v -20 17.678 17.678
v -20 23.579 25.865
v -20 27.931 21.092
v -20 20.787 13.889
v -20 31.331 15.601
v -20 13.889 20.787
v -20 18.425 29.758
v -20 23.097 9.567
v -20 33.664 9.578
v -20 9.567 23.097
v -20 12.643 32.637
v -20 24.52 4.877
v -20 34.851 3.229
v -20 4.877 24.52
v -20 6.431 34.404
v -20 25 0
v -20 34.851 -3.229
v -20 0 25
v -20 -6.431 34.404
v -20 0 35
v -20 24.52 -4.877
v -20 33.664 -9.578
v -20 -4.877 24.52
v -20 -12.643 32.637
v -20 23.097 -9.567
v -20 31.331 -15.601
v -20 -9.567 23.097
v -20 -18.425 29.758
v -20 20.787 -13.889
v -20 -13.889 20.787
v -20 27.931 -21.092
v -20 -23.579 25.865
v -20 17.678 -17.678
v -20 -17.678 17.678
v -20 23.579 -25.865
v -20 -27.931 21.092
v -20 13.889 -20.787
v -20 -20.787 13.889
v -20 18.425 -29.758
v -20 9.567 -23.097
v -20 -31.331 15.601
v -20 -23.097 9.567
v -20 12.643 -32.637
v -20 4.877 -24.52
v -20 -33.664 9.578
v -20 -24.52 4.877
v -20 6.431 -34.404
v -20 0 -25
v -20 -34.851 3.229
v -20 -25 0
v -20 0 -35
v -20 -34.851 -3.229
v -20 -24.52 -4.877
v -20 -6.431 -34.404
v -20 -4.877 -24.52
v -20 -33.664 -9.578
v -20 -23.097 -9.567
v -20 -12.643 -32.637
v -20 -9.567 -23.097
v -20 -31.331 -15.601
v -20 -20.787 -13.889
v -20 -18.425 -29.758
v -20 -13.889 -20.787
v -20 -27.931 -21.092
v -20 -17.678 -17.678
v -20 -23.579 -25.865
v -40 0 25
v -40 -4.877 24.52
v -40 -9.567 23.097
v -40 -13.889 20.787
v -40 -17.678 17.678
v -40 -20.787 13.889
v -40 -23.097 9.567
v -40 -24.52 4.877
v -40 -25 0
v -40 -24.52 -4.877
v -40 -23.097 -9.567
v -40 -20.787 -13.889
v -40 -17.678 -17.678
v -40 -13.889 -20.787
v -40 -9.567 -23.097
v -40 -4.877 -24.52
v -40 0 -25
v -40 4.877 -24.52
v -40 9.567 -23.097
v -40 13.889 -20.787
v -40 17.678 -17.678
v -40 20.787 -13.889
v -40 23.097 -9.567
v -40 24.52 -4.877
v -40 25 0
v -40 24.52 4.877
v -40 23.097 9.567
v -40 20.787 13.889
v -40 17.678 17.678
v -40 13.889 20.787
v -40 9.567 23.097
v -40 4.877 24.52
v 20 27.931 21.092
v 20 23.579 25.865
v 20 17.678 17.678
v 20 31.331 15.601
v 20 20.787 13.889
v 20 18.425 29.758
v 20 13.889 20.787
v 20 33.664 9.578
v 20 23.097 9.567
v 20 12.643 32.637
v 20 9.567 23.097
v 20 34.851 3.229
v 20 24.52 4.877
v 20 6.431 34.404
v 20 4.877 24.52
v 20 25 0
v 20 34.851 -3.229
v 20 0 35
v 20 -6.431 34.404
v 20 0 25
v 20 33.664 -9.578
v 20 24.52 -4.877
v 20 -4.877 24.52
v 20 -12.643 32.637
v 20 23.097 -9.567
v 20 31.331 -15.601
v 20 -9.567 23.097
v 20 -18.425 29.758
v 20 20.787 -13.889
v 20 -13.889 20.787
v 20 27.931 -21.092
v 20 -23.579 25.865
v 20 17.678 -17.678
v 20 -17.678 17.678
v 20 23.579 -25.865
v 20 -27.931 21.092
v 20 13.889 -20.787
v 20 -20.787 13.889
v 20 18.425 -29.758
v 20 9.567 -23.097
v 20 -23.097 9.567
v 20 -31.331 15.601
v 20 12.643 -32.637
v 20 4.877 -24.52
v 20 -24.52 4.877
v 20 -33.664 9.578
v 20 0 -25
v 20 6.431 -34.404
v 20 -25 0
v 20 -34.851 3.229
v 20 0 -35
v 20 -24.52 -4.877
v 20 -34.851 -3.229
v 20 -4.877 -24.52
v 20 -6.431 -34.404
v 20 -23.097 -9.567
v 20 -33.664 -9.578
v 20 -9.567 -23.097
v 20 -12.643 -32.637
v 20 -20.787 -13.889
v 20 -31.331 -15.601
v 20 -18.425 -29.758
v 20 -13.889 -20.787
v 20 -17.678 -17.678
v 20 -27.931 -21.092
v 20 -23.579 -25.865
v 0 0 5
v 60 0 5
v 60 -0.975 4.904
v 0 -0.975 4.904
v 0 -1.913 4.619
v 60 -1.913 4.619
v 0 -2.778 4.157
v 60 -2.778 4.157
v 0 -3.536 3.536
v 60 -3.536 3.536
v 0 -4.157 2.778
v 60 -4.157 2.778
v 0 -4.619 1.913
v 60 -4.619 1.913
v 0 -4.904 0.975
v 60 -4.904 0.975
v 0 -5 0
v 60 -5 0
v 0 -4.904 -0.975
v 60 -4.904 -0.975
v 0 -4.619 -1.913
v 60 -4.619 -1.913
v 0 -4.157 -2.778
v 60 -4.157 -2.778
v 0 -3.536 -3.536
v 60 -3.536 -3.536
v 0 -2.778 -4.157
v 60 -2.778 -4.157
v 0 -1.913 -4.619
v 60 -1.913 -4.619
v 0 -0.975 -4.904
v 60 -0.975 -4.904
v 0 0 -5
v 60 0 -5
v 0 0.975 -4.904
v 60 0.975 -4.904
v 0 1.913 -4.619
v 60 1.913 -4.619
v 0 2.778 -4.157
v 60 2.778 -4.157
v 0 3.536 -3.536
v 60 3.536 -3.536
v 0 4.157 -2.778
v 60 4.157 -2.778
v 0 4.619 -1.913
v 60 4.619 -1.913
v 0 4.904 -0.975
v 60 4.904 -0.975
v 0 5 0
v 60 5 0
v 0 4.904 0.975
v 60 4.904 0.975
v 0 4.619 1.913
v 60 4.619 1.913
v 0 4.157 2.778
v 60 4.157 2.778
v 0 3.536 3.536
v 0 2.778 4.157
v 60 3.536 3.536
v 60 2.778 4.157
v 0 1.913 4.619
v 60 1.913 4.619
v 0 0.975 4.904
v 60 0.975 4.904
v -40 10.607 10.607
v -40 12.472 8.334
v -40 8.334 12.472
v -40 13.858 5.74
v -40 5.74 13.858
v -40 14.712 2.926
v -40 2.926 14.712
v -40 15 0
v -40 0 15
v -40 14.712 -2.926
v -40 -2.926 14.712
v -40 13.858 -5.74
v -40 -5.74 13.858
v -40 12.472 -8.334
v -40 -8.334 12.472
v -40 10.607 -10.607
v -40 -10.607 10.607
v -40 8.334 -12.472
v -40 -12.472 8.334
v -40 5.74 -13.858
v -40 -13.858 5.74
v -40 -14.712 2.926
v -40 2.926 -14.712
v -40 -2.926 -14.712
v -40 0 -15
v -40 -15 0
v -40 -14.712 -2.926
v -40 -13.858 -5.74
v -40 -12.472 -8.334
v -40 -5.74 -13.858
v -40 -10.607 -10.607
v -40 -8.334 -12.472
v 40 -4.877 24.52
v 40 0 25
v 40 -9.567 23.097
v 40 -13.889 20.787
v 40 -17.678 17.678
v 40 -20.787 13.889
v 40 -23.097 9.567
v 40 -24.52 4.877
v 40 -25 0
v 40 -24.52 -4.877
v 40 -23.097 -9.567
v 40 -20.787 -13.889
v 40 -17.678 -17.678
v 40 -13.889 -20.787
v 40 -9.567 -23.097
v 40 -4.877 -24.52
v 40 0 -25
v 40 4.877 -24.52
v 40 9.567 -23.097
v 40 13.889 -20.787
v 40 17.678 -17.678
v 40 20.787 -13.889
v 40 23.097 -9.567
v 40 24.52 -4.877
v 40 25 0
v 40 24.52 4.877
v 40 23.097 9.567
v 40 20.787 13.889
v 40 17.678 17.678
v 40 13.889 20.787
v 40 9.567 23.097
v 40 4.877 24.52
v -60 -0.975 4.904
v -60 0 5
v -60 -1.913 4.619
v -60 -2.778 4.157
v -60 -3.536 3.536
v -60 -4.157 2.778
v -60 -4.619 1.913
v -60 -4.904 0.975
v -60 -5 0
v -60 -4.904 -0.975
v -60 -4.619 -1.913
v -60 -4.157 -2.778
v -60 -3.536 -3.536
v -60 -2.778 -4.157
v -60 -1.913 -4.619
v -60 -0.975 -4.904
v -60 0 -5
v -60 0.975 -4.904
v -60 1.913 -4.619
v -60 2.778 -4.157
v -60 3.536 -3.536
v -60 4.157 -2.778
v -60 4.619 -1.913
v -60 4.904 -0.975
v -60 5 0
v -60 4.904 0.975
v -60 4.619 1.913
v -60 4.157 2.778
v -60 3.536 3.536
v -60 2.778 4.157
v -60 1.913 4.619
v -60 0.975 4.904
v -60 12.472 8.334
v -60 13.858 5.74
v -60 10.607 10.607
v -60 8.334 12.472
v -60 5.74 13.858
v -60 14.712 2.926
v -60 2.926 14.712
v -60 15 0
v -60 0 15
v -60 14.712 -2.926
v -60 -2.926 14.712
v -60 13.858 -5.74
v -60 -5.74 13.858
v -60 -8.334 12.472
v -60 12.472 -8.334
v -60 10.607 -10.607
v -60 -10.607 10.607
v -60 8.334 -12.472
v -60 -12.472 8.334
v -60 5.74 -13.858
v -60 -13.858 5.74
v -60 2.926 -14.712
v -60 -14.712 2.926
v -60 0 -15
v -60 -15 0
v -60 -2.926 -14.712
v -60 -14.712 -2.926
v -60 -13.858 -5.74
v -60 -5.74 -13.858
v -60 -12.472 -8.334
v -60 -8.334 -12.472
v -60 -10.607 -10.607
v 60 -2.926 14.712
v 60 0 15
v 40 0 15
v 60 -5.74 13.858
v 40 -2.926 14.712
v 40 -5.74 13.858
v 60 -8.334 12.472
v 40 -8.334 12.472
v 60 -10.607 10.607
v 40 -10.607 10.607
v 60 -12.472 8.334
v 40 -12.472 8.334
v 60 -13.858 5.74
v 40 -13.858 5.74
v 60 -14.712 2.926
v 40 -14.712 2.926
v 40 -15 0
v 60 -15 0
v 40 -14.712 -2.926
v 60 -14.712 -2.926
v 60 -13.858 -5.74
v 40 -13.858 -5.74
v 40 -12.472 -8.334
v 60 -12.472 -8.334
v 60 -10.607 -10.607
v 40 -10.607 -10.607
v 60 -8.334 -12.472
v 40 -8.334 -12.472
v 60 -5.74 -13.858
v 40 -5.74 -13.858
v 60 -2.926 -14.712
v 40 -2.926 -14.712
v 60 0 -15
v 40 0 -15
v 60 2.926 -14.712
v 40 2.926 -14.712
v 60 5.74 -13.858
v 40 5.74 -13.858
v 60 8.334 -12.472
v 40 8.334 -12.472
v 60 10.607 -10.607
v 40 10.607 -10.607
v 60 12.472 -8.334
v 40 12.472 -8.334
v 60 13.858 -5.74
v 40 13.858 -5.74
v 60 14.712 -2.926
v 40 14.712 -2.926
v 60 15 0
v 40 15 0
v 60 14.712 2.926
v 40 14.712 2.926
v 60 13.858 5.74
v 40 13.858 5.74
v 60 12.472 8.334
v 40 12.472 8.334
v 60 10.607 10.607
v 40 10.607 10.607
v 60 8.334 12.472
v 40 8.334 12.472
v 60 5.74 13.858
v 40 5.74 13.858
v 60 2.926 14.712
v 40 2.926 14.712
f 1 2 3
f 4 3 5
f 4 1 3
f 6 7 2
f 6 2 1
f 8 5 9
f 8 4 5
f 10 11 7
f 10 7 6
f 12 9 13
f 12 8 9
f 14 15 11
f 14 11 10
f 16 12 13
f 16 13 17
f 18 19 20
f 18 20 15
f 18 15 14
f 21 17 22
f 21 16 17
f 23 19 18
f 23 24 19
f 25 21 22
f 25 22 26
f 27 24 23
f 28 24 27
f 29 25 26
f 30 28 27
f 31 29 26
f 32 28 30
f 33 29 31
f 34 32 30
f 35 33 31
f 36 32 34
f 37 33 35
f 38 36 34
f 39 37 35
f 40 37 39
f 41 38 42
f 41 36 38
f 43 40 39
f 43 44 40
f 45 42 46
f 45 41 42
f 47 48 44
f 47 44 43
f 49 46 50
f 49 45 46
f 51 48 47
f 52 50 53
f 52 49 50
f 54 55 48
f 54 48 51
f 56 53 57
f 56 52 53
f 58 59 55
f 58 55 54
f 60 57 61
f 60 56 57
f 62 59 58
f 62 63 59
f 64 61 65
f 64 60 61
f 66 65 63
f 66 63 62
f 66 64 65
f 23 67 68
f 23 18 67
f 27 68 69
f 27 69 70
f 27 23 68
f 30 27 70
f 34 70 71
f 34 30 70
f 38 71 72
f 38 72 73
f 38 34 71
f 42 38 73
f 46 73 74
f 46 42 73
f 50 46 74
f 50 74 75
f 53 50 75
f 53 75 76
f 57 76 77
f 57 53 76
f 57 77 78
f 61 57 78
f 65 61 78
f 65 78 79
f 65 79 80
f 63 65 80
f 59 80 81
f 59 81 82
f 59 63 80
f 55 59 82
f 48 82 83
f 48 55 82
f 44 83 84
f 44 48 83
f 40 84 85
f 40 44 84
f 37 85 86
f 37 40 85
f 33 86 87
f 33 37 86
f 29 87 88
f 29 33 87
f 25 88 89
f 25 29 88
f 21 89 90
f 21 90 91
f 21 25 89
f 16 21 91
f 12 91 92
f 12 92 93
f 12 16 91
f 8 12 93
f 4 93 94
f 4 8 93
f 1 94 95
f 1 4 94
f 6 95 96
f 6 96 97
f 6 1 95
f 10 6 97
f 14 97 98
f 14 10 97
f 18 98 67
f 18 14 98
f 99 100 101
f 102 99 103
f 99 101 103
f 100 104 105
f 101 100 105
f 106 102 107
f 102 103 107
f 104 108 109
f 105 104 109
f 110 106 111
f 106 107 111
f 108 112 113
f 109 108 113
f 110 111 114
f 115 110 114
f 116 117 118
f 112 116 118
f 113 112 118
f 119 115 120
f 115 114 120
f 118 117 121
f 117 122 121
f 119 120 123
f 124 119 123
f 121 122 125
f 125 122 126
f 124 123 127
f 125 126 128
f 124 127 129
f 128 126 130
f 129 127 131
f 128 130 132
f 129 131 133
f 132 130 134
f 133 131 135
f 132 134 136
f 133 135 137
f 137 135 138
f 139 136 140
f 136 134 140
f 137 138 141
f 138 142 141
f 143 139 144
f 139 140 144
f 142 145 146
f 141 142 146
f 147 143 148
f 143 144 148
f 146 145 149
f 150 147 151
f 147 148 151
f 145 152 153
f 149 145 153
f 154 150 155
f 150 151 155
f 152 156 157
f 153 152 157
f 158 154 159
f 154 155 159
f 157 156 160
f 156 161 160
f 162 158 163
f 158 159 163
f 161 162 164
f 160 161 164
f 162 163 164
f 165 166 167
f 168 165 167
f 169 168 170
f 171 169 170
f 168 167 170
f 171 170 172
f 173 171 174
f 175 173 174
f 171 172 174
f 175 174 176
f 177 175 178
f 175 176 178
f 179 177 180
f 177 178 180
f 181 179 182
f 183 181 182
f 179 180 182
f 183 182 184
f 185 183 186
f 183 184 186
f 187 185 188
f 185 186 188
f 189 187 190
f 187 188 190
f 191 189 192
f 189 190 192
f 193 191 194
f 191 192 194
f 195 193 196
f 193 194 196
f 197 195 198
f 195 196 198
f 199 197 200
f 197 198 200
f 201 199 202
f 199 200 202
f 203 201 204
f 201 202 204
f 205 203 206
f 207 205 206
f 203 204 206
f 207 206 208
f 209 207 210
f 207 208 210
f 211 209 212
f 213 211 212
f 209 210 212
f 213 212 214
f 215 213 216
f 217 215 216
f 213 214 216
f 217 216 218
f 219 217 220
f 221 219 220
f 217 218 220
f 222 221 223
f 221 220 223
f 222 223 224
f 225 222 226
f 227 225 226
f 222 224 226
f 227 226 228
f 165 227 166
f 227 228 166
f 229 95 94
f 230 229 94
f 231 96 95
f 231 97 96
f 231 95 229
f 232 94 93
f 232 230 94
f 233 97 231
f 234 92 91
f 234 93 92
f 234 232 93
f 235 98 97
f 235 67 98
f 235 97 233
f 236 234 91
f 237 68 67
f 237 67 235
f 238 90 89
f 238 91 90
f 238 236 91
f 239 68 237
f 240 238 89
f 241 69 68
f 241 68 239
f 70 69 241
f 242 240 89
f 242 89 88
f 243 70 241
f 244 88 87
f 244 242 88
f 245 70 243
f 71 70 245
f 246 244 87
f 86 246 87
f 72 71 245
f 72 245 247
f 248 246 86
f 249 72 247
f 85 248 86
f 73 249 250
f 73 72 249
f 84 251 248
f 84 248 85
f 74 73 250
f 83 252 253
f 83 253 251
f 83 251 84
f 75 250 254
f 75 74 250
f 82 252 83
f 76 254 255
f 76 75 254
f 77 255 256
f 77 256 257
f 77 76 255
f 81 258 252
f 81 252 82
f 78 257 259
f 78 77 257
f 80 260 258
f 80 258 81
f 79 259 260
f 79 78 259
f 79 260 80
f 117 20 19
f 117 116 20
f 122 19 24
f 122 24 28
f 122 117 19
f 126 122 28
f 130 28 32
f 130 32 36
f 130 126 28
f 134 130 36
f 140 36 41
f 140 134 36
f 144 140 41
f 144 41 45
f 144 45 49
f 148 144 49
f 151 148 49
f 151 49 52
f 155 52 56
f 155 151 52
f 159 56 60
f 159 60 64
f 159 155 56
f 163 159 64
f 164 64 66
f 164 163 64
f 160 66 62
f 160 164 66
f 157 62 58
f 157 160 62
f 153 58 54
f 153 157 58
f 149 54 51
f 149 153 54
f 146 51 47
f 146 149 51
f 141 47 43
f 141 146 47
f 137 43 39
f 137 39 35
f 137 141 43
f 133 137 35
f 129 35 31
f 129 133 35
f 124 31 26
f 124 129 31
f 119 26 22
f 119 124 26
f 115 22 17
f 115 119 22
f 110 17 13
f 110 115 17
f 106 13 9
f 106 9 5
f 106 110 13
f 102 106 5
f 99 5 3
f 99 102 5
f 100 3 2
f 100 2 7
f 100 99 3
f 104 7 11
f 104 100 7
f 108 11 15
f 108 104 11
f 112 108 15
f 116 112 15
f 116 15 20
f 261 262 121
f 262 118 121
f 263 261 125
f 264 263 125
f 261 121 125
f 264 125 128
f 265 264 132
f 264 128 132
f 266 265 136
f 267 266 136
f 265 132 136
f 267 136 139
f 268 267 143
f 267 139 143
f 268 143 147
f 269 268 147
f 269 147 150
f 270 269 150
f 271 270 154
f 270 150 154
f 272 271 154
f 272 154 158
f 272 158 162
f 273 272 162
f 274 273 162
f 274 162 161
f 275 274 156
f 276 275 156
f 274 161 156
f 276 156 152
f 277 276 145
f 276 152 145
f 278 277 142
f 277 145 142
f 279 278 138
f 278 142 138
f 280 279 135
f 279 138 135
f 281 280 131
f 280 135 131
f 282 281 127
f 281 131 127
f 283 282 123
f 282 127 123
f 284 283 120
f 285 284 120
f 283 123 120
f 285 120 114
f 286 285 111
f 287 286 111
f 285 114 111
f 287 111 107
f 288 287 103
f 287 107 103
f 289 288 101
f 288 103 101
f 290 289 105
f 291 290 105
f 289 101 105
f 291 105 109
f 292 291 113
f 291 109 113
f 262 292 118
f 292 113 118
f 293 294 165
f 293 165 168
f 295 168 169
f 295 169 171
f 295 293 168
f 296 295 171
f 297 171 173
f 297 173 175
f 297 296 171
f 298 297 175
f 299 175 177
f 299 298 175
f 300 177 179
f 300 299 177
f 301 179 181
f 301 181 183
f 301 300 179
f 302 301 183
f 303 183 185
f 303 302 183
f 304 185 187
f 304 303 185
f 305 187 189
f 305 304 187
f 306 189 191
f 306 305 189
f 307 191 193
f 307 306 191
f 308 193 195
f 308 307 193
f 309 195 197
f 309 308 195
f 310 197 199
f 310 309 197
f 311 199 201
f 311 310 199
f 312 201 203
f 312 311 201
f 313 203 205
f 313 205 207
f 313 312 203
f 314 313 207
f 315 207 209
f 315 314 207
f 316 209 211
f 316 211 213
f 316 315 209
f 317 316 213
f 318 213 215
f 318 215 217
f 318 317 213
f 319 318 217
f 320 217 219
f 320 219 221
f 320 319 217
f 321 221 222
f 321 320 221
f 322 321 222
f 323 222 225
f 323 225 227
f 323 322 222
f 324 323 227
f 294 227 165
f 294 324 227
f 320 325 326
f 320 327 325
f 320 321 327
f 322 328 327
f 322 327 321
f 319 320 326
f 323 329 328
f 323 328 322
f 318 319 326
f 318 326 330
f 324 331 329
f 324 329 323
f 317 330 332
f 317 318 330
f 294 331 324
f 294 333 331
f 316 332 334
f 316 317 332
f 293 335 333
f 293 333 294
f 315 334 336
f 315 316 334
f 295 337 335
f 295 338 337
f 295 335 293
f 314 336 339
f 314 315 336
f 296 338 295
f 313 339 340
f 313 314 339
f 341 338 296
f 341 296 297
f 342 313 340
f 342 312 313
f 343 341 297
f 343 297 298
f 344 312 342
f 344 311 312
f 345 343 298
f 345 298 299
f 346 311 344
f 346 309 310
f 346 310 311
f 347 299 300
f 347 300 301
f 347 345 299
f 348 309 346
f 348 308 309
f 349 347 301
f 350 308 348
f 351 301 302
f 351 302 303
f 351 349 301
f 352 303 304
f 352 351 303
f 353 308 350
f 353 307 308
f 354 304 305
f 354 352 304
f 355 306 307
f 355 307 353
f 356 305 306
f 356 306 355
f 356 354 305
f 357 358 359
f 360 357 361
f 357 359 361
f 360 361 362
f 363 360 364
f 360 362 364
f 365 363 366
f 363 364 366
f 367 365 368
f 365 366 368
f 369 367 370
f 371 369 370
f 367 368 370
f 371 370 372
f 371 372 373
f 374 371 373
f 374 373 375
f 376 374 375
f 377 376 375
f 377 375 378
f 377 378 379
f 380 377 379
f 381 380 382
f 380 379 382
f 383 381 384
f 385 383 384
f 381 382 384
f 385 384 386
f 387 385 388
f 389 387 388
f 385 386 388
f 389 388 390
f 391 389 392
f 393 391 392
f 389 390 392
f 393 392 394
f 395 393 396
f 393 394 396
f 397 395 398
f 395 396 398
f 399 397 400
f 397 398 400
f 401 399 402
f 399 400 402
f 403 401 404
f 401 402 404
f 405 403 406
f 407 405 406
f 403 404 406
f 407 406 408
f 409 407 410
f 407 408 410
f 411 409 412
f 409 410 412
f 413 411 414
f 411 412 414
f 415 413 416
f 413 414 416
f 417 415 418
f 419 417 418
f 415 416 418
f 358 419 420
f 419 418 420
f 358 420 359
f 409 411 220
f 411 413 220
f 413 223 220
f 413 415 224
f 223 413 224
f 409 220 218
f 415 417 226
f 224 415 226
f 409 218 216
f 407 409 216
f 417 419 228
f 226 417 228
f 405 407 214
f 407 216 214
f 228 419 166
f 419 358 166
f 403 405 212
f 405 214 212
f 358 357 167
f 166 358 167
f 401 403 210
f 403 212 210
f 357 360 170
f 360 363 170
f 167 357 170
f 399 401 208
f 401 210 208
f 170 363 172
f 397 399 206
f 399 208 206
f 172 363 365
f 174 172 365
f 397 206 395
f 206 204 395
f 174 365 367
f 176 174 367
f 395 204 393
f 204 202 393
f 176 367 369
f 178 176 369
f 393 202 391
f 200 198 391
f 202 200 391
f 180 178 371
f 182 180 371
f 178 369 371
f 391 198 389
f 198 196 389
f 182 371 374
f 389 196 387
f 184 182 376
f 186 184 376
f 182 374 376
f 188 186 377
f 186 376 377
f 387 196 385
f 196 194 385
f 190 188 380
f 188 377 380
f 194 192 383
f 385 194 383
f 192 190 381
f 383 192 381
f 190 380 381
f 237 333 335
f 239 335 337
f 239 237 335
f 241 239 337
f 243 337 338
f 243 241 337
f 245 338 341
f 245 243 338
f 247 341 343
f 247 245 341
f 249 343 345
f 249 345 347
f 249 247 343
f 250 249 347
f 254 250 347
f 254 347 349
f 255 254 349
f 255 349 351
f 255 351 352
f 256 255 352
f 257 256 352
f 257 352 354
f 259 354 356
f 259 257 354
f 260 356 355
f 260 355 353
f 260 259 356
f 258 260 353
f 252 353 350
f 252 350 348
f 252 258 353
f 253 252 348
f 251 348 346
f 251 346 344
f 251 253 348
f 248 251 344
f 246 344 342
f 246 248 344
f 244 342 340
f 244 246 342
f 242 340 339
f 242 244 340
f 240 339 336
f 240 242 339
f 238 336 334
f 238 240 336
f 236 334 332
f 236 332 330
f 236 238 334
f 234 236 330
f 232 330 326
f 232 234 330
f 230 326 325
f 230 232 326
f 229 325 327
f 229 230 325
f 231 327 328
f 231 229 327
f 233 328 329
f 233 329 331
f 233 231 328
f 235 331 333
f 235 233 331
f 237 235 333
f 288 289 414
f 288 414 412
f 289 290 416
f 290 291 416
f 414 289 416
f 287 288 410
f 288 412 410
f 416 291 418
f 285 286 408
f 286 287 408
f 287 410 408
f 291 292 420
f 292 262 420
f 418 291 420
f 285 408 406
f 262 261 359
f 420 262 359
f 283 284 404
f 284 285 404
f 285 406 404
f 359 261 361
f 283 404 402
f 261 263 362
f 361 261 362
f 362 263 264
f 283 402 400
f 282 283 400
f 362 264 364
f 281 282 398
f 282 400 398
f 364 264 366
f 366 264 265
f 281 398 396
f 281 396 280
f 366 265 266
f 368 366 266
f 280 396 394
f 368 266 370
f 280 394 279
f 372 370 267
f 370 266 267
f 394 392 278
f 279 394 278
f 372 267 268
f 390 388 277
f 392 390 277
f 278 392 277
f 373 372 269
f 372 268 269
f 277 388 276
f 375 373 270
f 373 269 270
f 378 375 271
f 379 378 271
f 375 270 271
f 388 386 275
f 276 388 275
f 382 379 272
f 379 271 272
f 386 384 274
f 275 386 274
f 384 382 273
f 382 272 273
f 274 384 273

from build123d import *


with BuildPart() as f1:
    # F0 (on Front) → F1 (revolve)
    with BuildSketch(Plane.XZ):
        Polygon((20, 35), (0, 35), (0, 5), (13.305354, 5), (20, 5), (24.382994, 5), (40, 5), (60, 5), (60, 15), (40, 15), (40, 25), (20, 25), align=None)
    revolve(axis=Axis((22.793579, 0, 0), (1, 0, 0)))

    # F2: F1 across plane


with BuildPart() as f1_1:
    add(f1.part)
    add(f1.part.mirror(Plane.YZ))


solid = f1_1.part
